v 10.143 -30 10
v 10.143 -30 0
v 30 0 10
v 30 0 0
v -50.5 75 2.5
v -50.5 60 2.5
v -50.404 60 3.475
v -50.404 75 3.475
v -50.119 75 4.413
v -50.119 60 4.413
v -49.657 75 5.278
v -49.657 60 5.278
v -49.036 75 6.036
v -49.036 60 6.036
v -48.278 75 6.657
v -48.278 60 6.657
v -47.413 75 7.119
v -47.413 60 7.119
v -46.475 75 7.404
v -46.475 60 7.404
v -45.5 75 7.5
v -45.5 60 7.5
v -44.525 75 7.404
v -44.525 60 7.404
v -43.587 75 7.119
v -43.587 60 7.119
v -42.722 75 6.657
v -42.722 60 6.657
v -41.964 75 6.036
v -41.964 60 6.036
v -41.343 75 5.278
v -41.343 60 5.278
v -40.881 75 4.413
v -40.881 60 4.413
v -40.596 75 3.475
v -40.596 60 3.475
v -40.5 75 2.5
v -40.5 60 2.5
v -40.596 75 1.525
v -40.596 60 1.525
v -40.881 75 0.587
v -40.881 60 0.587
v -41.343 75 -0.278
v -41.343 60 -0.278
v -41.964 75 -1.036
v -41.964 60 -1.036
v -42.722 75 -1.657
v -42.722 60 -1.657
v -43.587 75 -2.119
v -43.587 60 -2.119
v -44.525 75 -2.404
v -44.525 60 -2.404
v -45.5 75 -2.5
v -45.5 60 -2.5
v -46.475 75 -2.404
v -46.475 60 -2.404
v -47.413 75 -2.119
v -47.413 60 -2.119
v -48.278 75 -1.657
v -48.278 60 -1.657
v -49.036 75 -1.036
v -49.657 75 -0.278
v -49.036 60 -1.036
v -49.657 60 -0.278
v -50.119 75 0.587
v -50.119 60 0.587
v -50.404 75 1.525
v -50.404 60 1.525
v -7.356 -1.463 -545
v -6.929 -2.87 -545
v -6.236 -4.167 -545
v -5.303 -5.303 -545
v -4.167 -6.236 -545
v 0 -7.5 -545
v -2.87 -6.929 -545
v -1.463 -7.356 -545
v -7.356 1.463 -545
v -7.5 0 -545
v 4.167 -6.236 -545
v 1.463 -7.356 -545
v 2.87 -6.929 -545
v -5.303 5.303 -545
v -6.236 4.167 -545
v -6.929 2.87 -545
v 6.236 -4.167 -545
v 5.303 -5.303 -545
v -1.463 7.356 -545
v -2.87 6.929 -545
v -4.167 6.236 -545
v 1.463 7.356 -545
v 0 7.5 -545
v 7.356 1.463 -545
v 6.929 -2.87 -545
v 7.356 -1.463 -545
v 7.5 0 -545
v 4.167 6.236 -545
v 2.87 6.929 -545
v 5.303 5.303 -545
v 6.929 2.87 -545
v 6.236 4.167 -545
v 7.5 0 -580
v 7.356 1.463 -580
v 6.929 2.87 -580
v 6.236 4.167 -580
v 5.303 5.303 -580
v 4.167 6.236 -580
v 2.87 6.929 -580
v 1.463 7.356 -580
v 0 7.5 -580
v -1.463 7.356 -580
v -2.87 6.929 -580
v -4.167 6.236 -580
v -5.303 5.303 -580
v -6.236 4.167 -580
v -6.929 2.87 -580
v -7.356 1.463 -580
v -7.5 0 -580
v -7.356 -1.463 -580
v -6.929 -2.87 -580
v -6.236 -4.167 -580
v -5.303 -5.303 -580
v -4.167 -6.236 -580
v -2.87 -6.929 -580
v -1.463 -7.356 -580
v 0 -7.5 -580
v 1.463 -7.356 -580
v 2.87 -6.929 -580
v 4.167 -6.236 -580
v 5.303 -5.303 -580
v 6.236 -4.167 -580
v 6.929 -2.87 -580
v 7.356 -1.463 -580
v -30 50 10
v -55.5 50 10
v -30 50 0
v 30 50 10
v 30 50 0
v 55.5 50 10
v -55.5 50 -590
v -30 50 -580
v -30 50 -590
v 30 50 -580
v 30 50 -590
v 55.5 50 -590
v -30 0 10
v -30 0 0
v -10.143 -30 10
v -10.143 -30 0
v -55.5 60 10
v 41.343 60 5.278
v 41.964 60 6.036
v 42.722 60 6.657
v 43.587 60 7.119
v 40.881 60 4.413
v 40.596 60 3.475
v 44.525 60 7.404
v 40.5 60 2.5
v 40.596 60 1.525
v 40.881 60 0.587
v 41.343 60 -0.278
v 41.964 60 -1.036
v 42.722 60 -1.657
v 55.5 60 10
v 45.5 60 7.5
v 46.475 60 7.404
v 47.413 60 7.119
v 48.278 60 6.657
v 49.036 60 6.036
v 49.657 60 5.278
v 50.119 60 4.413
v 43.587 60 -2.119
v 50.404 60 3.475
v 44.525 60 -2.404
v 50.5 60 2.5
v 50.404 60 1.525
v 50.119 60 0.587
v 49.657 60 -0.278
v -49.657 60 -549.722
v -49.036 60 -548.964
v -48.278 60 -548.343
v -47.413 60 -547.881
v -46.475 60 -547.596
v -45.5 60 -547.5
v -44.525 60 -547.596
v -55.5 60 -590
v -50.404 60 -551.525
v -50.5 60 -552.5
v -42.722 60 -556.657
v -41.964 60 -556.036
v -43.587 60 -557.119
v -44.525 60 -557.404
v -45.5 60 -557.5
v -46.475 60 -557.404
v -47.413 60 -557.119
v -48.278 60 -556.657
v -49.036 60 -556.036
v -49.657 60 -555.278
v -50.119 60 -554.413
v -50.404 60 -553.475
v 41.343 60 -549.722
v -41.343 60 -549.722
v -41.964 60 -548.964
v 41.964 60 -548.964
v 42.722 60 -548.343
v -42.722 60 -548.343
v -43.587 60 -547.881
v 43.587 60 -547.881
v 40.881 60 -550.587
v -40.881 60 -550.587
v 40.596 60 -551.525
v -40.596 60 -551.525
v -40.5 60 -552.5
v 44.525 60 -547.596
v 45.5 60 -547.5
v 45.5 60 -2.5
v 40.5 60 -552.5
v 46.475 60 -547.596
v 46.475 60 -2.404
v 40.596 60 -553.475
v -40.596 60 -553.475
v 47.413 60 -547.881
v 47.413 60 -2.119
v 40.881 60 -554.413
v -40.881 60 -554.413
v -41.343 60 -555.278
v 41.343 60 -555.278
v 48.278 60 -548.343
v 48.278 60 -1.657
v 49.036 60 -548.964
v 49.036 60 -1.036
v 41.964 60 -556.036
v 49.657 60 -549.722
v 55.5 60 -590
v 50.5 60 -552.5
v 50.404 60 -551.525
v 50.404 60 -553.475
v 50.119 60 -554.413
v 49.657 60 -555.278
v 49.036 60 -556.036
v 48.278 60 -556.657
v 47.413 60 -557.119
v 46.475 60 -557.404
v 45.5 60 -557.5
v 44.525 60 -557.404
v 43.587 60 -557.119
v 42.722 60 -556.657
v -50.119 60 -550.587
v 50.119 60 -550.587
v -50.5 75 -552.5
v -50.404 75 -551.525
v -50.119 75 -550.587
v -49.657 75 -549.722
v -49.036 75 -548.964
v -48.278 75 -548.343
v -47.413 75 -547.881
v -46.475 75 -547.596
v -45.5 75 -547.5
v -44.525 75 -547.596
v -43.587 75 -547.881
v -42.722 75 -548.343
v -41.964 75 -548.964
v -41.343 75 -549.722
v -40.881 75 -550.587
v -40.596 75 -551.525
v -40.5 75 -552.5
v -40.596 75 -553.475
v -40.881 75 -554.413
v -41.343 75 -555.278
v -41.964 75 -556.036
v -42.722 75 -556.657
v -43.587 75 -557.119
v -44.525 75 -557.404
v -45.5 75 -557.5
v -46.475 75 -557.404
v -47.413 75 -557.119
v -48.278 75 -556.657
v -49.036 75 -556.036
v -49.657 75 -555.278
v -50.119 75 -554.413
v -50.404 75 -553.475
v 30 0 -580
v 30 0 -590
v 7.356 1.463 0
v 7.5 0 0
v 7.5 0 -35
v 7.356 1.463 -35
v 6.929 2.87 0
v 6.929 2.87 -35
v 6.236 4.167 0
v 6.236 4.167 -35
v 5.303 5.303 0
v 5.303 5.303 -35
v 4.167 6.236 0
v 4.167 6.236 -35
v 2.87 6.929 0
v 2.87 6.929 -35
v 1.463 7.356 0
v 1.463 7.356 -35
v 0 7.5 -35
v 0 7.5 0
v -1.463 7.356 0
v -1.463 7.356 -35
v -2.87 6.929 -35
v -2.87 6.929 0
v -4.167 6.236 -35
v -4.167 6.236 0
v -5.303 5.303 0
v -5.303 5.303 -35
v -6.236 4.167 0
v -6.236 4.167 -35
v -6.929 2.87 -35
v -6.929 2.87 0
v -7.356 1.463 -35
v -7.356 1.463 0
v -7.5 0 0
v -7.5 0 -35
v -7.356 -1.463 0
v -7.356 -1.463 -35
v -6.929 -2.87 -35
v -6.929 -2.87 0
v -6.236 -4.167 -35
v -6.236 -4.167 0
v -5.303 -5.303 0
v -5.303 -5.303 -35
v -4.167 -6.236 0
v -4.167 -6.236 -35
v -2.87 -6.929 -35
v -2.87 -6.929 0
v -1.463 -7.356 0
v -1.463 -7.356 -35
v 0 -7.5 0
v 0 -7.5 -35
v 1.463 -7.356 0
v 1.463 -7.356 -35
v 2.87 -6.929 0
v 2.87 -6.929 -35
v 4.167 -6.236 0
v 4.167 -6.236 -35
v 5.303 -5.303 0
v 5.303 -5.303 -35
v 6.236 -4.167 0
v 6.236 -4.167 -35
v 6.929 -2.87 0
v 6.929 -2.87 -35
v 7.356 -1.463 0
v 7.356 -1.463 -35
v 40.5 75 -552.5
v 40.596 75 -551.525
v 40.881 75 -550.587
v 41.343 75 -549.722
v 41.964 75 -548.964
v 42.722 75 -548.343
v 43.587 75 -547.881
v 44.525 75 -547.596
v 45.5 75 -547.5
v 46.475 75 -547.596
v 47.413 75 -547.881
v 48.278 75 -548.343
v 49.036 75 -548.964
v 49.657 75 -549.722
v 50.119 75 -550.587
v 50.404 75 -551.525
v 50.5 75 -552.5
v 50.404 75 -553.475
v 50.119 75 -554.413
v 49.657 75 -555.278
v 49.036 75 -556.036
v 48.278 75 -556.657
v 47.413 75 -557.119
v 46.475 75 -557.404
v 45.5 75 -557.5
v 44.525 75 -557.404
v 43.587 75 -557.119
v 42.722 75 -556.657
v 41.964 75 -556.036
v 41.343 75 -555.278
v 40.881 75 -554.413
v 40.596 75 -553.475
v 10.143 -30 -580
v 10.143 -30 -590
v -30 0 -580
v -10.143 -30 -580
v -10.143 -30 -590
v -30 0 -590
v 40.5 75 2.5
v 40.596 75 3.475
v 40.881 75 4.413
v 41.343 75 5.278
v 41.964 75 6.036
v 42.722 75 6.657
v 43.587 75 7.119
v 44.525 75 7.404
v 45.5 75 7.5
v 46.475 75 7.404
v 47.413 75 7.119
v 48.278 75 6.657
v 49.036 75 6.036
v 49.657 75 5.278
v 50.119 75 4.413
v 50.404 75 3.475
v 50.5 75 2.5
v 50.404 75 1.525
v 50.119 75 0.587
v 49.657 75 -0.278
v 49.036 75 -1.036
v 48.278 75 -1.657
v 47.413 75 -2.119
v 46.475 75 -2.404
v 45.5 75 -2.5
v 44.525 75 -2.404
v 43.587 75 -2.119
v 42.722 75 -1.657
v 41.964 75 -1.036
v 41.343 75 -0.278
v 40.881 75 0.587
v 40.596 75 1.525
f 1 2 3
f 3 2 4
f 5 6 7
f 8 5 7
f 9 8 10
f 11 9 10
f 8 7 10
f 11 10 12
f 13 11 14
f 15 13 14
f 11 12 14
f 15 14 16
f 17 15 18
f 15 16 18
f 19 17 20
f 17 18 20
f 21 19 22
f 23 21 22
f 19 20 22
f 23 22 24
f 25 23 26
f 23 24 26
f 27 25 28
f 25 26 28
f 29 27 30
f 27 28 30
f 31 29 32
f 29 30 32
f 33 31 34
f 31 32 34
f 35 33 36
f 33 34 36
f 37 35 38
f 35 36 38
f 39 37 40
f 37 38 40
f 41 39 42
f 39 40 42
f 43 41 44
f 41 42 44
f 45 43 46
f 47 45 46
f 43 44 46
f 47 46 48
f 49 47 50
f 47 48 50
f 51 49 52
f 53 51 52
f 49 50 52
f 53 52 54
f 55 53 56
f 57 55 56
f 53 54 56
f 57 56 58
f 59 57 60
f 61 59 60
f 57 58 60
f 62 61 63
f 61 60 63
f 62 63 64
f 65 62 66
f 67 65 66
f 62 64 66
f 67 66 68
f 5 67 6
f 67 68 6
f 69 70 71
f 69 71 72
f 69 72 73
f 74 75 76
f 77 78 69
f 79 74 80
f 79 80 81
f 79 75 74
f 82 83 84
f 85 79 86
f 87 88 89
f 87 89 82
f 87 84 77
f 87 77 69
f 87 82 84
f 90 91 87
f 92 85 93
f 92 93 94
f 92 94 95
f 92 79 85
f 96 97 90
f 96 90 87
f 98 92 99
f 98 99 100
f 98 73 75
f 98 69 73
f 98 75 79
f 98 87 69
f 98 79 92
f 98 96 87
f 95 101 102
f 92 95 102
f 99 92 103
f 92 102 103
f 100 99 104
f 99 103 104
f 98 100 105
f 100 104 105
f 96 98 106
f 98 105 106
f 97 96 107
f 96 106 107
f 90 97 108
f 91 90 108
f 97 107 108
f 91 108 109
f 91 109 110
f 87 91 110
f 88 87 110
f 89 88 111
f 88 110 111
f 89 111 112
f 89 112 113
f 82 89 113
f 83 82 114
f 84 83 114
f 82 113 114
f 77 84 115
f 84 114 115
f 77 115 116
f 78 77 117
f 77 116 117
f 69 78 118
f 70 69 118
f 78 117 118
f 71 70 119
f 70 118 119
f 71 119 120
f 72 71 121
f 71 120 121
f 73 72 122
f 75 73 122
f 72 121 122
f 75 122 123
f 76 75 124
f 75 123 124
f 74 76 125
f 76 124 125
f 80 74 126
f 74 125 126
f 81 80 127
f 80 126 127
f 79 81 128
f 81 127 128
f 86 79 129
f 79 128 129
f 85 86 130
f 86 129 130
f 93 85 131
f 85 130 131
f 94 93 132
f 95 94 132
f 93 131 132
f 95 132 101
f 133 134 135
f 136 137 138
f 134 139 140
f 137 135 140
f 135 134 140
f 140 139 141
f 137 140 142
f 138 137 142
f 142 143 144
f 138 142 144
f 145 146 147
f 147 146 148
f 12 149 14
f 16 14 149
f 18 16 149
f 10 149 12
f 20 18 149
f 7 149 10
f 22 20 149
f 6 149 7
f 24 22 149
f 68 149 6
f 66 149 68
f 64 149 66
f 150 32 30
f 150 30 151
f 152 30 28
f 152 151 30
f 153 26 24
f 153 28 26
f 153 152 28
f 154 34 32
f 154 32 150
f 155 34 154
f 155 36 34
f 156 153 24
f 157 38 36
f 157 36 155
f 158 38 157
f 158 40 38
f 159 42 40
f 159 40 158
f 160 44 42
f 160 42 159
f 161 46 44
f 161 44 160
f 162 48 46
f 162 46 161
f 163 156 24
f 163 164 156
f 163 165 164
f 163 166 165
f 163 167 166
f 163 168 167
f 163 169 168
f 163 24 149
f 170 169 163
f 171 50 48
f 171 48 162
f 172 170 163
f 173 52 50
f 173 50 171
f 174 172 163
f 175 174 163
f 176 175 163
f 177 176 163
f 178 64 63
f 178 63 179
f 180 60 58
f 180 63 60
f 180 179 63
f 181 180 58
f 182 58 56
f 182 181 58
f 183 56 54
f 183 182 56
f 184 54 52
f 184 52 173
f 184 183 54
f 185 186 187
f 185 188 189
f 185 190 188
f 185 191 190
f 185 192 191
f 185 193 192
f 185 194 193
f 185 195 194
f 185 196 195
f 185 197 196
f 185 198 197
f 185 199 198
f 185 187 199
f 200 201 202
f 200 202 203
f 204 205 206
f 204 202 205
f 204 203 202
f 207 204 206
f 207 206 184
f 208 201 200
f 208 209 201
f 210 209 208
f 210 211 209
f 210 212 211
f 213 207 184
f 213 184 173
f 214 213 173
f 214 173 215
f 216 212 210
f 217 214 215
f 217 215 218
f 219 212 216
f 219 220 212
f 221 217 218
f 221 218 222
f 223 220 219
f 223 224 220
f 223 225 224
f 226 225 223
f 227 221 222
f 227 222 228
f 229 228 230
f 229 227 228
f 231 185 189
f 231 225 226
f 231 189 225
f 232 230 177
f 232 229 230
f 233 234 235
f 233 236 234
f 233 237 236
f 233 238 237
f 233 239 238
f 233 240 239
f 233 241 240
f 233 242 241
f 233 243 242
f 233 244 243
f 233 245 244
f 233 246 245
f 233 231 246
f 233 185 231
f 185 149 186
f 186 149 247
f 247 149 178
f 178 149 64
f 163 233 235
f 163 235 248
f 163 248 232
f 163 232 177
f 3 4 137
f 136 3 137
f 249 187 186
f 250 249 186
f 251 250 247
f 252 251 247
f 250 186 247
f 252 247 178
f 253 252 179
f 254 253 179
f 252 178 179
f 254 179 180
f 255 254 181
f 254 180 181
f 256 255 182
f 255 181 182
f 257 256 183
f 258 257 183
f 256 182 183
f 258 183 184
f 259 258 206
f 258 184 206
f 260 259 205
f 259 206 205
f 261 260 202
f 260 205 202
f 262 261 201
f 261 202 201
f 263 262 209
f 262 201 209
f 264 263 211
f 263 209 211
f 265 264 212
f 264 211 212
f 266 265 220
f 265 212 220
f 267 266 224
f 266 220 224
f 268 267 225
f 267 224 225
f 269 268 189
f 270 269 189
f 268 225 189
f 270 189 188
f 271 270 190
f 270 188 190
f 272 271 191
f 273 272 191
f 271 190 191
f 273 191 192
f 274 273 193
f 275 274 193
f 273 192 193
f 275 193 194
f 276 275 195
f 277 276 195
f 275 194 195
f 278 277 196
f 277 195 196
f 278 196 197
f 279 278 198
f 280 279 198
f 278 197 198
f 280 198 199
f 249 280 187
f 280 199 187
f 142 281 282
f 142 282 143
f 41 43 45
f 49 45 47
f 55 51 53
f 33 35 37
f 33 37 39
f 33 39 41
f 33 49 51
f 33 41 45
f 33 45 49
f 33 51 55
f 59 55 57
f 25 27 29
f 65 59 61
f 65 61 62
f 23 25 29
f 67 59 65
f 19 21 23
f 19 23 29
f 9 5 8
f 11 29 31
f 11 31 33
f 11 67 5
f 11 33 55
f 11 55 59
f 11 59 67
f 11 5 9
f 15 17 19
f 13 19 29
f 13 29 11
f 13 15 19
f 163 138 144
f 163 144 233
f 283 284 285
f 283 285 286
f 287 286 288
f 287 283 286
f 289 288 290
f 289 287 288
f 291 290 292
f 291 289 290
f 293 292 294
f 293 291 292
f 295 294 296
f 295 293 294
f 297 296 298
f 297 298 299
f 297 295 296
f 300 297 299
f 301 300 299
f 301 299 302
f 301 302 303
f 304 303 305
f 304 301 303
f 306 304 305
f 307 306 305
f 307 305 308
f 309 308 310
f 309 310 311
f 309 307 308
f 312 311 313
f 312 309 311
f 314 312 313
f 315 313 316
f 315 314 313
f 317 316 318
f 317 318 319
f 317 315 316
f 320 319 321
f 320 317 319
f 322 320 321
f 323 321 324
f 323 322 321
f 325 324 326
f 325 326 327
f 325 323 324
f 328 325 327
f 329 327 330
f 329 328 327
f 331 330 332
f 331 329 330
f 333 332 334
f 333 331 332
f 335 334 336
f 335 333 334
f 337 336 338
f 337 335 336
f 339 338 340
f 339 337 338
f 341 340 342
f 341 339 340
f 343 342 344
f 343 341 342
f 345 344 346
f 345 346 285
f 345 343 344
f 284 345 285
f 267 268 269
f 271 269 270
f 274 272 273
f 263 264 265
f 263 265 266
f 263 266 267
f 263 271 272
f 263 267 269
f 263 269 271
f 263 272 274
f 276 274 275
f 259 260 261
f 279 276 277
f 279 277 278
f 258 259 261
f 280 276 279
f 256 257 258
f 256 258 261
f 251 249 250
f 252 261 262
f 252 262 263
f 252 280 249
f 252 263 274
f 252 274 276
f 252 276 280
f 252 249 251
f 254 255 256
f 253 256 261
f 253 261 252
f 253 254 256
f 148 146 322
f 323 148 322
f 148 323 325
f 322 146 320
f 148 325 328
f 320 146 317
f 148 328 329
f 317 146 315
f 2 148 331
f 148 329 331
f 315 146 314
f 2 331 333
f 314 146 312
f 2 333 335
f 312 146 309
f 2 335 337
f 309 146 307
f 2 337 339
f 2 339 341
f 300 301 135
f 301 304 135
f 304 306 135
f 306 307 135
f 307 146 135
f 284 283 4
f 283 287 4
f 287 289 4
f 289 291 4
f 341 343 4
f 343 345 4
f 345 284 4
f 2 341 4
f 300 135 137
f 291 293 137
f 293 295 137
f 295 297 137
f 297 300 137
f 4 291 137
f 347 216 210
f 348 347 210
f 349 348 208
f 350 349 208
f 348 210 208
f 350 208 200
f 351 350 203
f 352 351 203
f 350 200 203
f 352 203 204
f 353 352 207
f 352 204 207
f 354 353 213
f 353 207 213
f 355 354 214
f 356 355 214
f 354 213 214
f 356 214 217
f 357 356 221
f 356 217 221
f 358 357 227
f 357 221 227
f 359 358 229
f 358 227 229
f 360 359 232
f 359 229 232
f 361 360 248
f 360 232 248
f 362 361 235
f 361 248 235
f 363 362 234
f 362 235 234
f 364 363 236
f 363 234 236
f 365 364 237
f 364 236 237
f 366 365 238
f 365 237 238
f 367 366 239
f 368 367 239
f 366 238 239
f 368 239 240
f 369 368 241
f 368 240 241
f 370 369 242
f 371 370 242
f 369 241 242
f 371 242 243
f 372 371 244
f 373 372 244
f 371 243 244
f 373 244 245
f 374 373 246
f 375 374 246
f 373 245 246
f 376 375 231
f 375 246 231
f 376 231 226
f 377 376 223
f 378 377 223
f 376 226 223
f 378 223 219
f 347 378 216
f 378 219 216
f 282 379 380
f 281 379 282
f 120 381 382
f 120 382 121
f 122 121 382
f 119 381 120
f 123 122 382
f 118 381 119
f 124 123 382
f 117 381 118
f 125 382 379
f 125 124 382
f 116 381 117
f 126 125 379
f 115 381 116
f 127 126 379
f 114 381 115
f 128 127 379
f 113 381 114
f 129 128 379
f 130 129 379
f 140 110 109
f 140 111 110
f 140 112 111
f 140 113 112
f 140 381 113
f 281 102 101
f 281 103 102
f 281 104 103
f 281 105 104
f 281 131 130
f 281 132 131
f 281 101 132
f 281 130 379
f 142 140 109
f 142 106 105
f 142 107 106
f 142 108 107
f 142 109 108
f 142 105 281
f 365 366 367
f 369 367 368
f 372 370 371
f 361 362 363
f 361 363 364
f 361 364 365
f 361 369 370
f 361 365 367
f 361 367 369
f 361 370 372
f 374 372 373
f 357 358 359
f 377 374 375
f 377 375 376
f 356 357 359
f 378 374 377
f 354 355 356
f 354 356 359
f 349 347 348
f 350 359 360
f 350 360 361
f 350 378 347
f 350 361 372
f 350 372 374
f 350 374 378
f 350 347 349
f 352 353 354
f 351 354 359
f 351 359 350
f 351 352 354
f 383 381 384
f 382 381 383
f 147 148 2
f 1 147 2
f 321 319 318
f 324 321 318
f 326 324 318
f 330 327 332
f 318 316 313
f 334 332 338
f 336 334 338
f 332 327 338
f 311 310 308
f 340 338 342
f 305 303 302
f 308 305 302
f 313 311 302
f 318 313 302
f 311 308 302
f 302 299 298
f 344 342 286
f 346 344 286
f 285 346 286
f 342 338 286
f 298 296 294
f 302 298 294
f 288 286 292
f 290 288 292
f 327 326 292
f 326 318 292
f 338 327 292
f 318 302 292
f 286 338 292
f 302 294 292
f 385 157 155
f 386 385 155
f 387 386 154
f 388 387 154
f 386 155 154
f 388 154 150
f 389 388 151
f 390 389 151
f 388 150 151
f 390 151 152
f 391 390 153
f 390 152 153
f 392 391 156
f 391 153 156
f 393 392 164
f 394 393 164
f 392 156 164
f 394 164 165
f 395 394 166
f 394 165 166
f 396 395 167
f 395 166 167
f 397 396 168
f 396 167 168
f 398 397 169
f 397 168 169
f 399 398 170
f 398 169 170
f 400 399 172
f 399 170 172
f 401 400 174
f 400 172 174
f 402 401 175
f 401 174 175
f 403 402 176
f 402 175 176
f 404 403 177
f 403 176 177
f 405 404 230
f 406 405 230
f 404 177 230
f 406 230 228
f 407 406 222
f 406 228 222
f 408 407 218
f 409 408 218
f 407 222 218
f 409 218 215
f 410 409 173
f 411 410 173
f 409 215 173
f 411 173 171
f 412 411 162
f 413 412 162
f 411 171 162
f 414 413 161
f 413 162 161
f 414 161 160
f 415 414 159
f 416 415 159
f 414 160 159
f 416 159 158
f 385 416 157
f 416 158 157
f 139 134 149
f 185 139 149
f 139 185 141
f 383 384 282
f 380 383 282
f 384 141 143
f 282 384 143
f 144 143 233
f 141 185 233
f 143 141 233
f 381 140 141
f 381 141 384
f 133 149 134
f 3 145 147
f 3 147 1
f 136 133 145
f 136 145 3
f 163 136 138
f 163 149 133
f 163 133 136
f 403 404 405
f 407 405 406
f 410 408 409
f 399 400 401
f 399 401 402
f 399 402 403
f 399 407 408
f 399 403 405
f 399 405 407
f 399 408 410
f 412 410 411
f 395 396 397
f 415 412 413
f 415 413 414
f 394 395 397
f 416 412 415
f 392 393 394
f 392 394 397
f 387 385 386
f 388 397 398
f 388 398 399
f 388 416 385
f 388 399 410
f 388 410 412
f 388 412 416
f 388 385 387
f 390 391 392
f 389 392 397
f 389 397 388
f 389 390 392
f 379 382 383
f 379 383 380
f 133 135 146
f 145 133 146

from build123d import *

# Parameters (mm, degrees)
BOSS_EXTRUDE1_DEPTH = 10
SKETCH1_3_R         = 7.5
BOSS_EXTRUDE2_DEPTH = 35
SKETCH3_W           = 111
SKETCH3_H           = 10
BOSS_EXTRUDE3_DEPTH = 300
SKETCH4_R           = 5
BOSS_EXTRUDE4_DEPTH = 15


with BuildPart() as part:
    # Sketch1 → Boss-Extrude1 (new body)
    with BuildSketch(Plane.XY):
        Polygon((10.143306561, -30), (30, 0), (30, 50), (-30, 50), (-30, 0), (-10.143306561, -30), align=None)
    boss_extrude1 = extrude(amount=BOSS_EXTRUDE1_DEPTH)

    # Sketch1<3> → Boss-Extrude2 (add)
    with BuildSketch(Plane.XY):
        Circle(SKETCH1_3_R)
    boss_extrude2 = extrude(amount=-BOSS_EXTRUDE2_DEPTH)

    # Sketch3 → Boss-Extrude3 (add)
    with BuildSketch(Plane.XY.offset(10)):
        with Locations((0, 55)):
            Rectangle(SKETCH3_W, SKETCH3_H)
    boss_extrude3 = extrude(amount=-BOSS_EXTRUDE3_DEPTH)

    # Mirror1: Boss-Extrude1, Boss-Extrude2, Boss-Extrude3 across plane
    add(boss_extrude1.mirror(Plane(origin=(0, 0, -290), x_dir=(1, 0, 0), z_dir=(0, 0, -1))))
    add(boss_extrude2.mirror(Plane(origin=(0, 0, -290), x_dir=(1, 0, 0), z_dir=(0, 0, -1))))
    add(boss_extrude3.mirror(Plane(origin=(0, 0, -290), x_dir=(1, 0, 0), z_dir=(0, 0, -1))))

    # Sketch4 → Boss-Extrude4 (add)
    with BuildSketch(Plane(origin=(0, 60, 0), x_dir=(1, 0, 0), z_dir=(0, 1, 0))):
        with Locations((-45.5, -2.5)):
            Circle(SKETCH4_R)
        with Locations((45.5, -2.5)):
            Circle(SKETCH4_R)
        with Locations((-45.5, 552.5)):
            Circle(SKETCH4_R)
        with Locations((45.5, 552.5)):
            Circle(SKETCH4_R)
    extrude(amount=BOSS_EXTRUDE4_DEPTH)


solid = part.part
